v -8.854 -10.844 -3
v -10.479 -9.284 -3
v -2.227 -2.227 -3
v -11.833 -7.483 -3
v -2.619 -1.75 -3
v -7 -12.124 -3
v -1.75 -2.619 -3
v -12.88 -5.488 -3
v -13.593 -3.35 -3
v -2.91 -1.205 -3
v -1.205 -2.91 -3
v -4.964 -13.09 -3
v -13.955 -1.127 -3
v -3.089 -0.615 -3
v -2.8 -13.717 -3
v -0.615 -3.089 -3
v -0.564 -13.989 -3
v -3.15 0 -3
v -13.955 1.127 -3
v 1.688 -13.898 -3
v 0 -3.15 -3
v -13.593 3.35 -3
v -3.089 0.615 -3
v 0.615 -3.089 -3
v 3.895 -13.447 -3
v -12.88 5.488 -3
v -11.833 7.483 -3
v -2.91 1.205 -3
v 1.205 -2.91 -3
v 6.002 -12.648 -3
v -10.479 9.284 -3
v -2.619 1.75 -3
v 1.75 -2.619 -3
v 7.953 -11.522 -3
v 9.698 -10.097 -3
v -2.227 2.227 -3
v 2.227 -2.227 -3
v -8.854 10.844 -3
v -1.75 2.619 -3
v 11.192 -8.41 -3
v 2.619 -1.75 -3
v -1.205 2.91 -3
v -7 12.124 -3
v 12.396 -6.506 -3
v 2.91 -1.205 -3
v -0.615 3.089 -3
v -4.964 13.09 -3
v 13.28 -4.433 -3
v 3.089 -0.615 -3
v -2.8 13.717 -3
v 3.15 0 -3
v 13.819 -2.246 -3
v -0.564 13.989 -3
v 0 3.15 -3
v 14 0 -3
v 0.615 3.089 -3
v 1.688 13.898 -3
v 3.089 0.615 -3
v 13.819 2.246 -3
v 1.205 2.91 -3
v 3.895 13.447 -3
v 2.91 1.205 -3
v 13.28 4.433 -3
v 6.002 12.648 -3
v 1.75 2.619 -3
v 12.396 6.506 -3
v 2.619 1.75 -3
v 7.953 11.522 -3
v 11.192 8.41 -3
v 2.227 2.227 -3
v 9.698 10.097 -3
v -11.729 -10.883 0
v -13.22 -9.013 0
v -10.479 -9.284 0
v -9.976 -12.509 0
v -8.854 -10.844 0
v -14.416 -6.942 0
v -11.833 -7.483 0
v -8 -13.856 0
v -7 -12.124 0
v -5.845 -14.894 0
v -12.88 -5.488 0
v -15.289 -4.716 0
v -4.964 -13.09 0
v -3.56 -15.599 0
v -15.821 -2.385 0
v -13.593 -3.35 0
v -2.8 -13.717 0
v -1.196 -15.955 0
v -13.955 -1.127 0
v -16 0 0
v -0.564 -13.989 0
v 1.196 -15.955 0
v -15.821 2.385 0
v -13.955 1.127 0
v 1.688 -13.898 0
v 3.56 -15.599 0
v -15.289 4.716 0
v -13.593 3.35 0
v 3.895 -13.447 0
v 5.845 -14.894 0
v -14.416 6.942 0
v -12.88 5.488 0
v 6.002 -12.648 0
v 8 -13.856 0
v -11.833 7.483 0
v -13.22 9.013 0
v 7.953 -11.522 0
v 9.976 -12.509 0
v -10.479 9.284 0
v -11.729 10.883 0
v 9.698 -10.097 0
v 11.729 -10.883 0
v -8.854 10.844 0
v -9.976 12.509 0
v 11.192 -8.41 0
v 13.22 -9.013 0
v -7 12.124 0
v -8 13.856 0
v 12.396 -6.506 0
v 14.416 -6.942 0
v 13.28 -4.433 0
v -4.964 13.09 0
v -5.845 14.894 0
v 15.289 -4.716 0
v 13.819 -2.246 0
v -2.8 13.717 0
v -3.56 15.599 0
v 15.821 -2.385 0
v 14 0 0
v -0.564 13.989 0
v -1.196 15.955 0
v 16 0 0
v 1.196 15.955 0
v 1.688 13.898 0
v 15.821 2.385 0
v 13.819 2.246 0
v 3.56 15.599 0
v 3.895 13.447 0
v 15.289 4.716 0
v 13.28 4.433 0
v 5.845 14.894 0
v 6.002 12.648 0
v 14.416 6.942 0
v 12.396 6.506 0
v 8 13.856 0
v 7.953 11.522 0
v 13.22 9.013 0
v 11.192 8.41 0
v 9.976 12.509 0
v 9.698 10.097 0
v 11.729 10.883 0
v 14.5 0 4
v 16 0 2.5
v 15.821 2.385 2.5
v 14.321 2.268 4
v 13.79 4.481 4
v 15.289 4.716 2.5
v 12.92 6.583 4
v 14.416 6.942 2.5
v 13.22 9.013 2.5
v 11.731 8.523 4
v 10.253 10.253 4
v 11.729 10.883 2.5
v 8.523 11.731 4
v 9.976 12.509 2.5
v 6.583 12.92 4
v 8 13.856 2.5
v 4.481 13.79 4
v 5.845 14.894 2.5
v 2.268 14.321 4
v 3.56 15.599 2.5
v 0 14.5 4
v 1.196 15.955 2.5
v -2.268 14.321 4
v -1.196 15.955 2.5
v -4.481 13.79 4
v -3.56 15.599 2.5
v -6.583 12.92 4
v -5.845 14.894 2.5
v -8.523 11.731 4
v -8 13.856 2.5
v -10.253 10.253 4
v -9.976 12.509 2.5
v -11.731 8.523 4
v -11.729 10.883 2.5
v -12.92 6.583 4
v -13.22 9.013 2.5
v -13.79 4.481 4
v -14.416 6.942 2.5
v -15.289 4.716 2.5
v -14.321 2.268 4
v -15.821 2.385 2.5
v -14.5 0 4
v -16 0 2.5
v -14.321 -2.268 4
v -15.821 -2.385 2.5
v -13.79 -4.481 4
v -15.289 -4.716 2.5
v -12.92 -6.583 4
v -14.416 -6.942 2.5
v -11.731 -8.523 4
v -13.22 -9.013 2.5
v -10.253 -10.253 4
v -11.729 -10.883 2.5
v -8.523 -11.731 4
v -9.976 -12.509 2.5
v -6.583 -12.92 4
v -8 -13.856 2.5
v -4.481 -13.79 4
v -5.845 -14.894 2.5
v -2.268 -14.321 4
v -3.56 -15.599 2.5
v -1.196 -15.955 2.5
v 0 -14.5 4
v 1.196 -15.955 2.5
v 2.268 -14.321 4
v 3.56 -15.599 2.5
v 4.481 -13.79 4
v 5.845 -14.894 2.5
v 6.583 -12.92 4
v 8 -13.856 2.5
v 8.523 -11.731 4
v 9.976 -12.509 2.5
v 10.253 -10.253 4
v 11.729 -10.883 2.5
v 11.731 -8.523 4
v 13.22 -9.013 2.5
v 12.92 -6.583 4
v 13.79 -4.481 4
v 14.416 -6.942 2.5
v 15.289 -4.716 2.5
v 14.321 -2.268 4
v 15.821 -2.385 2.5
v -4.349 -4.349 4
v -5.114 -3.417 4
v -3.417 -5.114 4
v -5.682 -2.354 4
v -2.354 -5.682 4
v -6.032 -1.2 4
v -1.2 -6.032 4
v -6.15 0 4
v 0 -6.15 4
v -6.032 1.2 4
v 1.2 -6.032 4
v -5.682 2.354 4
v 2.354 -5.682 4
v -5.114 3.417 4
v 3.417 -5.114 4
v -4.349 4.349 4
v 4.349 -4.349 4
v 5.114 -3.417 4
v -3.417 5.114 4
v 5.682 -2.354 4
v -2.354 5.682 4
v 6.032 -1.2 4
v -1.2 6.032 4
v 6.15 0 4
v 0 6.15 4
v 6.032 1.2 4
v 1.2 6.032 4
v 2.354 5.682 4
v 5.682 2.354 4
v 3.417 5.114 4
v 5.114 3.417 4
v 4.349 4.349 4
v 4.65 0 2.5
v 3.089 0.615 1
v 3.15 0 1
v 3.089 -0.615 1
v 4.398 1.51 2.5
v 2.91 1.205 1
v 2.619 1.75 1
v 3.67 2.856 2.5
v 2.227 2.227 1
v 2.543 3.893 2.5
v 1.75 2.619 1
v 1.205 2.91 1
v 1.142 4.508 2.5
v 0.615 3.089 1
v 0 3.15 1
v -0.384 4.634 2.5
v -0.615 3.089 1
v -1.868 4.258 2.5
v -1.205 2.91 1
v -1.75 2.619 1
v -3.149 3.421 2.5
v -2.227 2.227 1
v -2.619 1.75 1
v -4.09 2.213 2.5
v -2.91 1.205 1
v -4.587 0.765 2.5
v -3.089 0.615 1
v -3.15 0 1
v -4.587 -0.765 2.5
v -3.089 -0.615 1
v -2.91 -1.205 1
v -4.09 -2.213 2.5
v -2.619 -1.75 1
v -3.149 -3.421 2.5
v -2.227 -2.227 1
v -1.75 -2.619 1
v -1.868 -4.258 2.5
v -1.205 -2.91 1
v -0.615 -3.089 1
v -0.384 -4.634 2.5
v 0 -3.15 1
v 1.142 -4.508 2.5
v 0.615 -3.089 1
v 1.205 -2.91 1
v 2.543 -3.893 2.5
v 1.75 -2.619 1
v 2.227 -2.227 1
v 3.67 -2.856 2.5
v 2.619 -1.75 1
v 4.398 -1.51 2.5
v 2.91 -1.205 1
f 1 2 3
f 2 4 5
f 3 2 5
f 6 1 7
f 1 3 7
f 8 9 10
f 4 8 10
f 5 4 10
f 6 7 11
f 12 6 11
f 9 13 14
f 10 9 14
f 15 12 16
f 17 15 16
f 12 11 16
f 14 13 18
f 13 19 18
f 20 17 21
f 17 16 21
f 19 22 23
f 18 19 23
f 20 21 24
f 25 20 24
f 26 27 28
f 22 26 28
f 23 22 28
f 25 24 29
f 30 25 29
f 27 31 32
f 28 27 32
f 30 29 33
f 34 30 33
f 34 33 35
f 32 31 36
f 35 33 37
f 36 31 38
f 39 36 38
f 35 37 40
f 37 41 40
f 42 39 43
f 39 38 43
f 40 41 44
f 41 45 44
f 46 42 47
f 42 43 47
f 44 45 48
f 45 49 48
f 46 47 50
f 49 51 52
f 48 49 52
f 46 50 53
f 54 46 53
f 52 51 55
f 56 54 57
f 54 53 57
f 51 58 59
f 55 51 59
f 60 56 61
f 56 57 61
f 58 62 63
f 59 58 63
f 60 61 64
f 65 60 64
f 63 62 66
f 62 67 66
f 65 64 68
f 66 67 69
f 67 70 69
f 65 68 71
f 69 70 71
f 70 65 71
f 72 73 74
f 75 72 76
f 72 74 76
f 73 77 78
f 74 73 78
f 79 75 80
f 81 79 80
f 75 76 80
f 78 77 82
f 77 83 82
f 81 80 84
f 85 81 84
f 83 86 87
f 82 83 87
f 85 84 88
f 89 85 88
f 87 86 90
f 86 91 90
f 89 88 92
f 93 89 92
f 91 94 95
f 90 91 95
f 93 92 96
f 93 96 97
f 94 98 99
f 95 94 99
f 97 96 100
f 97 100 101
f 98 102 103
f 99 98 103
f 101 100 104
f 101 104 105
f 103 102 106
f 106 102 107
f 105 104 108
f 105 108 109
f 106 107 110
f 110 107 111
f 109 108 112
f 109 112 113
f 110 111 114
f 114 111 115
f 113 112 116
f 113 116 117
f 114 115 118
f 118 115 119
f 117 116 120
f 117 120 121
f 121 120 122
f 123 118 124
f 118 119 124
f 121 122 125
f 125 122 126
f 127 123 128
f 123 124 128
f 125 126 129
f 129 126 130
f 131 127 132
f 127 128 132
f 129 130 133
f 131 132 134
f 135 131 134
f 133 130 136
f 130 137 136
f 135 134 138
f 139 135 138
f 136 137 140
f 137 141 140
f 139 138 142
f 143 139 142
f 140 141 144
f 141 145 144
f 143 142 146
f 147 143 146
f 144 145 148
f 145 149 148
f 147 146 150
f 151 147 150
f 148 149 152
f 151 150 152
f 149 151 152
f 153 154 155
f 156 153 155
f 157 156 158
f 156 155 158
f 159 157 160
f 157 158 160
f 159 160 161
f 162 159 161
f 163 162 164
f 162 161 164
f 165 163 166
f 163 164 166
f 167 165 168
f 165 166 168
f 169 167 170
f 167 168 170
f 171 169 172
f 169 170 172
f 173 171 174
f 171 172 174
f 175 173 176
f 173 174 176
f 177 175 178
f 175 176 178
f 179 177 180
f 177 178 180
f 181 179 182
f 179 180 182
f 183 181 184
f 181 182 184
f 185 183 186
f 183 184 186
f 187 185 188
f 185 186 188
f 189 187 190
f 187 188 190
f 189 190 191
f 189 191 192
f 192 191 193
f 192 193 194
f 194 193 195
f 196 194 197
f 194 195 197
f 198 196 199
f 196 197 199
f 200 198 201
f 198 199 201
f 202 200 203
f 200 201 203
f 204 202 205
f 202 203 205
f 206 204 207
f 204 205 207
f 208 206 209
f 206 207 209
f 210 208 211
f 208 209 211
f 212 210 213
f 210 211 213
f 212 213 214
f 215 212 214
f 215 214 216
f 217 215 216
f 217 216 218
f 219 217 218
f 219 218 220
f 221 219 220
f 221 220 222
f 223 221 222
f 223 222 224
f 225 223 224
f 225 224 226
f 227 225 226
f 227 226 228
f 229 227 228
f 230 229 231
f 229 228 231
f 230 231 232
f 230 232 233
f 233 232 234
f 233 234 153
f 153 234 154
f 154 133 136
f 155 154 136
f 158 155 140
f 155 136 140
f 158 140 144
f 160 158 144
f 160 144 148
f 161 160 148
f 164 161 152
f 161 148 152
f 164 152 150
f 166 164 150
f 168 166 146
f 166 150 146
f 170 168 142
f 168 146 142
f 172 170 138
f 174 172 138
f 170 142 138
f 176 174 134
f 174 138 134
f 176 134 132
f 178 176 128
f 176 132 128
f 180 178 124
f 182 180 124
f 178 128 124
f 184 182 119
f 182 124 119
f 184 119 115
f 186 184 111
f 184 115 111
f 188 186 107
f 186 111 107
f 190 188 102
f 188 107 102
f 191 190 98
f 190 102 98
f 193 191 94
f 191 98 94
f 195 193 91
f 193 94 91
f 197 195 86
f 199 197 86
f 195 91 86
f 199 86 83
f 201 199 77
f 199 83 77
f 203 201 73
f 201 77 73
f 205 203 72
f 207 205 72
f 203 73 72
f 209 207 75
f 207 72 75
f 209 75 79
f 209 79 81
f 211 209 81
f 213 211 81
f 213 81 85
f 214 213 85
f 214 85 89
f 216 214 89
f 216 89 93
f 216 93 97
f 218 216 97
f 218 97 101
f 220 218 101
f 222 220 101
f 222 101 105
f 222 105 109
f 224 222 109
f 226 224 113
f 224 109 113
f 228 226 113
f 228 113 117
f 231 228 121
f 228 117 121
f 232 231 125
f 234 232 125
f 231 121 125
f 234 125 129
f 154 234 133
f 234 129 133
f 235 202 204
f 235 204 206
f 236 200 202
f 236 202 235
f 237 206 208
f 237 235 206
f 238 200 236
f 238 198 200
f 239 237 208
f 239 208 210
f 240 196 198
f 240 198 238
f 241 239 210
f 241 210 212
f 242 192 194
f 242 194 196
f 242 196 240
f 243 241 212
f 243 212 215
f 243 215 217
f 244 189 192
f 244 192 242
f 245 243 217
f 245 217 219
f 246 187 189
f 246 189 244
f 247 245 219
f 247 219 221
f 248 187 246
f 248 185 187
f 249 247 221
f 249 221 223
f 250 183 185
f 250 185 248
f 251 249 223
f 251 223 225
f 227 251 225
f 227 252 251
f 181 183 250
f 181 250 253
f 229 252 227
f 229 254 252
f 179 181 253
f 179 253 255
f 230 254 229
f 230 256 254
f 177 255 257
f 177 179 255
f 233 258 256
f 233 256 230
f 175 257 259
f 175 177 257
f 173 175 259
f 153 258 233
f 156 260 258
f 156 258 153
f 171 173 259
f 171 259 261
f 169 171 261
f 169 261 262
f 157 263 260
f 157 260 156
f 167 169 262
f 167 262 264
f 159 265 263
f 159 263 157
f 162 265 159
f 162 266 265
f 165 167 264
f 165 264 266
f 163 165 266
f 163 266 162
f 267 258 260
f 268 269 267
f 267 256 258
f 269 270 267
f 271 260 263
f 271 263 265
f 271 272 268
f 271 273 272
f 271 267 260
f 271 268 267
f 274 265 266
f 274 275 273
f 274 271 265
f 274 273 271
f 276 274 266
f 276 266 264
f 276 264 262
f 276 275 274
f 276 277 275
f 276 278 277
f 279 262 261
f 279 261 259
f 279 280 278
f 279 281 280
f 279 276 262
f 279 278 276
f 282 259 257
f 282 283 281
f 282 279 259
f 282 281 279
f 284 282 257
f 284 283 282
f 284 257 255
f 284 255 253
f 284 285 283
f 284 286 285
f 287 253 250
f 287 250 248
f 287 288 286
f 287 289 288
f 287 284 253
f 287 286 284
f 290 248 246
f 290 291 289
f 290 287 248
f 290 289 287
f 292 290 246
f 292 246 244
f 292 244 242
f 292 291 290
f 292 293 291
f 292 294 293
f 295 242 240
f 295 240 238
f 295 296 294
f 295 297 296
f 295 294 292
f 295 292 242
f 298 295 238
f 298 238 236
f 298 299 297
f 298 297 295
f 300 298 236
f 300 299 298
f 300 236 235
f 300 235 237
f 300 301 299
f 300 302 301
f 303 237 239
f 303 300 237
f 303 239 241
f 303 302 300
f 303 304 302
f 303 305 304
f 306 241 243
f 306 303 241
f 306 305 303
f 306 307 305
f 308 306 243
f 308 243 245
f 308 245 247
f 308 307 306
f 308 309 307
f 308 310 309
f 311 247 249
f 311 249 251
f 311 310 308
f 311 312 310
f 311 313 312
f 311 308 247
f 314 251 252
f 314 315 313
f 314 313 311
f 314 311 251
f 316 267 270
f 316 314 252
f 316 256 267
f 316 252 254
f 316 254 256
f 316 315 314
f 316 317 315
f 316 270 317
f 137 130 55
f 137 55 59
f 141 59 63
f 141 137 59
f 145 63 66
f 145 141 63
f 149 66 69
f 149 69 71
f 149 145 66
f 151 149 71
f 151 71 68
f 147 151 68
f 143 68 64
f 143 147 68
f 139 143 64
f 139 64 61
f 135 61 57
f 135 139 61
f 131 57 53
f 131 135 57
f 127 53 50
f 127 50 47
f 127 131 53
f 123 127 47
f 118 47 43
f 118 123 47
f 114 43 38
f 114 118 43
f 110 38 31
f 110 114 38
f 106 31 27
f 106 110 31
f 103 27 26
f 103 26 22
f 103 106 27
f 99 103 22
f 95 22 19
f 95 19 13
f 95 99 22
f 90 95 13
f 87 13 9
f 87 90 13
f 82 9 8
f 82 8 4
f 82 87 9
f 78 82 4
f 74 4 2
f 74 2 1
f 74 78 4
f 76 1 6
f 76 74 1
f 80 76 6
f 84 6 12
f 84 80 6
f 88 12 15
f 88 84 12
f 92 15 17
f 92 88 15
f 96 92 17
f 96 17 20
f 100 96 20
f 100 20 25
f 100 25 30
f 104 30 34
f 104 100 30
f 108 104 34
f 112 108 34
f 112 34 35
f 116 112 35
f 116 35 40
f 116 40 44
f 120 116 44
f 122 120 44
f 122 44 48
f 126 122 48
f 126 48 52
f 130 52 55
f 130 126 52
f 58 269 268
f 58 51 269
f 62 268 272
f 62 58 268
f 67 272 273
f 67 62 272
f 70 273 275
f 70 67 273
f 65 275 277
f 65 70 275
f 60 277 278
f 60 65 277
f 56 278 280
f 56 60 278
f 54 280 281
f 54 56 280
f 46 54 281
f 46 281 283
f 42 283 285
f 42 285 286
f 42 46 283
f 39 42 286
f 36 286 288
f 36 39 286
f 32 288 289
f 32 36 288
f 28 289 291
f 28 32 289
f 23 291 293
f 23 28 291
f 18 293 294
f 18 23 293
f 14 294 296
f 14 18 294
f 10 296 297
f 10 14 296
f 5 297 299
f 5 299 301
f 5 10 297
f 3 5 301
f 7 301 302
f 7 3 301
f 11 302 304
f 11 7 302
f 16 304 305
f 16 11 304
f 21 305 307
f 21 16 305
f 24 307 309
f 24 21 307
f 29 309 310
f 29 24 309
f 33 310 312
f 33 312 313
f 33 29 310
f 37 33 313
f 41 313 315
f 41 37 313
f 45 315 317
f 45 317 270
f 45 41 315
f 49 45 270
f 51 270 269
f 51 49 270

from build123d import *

# Parameters (mm, degrees)
F0_R     = 16
F0_R_2   = 14
F0_R_3   = 3.15
F1_DEPTH = 4
F2_DEPTH = 3
F3_SIZE  = 3
F4_SIZE  = 1.5


with BuildPart() as f1:
    # F0 (on Top) → F1 (new body)
    with BuildSketch(Plane.XY):
        Circle(F0_R)
        Circle(F0_R_2, mode=Mode.SUBTRACT)
        Circle(F0_R_2)
        Circle(F0_R_3, mode=Mode.SUBTRACT)
    extrude(amount=F1_DEPTH)

    # F0 (on Top) → F2 (join)
    with BuildSketch(Plane.XY):
        Circle(F0_R_2)
        Circle(F0_R_3, mode=Mode.SUBTRACT)
    extrude(amount=-F2_DEPTH)

    # F3
    f3_edges = [f1.edges().sort_by_distance(p)[0] for p in [
        (-3.15, 0, 4),
    ]]
    chamfer(f3_edges, length=F3_SIZE)

    # F4
    f4_edges = [f1.edges().sort_by_distance(p)[0] for p in [
        (-16, 0, 4),
    ]]
    chamfer(f4_edges, length=F4_SIZE)


solid = f1.part
